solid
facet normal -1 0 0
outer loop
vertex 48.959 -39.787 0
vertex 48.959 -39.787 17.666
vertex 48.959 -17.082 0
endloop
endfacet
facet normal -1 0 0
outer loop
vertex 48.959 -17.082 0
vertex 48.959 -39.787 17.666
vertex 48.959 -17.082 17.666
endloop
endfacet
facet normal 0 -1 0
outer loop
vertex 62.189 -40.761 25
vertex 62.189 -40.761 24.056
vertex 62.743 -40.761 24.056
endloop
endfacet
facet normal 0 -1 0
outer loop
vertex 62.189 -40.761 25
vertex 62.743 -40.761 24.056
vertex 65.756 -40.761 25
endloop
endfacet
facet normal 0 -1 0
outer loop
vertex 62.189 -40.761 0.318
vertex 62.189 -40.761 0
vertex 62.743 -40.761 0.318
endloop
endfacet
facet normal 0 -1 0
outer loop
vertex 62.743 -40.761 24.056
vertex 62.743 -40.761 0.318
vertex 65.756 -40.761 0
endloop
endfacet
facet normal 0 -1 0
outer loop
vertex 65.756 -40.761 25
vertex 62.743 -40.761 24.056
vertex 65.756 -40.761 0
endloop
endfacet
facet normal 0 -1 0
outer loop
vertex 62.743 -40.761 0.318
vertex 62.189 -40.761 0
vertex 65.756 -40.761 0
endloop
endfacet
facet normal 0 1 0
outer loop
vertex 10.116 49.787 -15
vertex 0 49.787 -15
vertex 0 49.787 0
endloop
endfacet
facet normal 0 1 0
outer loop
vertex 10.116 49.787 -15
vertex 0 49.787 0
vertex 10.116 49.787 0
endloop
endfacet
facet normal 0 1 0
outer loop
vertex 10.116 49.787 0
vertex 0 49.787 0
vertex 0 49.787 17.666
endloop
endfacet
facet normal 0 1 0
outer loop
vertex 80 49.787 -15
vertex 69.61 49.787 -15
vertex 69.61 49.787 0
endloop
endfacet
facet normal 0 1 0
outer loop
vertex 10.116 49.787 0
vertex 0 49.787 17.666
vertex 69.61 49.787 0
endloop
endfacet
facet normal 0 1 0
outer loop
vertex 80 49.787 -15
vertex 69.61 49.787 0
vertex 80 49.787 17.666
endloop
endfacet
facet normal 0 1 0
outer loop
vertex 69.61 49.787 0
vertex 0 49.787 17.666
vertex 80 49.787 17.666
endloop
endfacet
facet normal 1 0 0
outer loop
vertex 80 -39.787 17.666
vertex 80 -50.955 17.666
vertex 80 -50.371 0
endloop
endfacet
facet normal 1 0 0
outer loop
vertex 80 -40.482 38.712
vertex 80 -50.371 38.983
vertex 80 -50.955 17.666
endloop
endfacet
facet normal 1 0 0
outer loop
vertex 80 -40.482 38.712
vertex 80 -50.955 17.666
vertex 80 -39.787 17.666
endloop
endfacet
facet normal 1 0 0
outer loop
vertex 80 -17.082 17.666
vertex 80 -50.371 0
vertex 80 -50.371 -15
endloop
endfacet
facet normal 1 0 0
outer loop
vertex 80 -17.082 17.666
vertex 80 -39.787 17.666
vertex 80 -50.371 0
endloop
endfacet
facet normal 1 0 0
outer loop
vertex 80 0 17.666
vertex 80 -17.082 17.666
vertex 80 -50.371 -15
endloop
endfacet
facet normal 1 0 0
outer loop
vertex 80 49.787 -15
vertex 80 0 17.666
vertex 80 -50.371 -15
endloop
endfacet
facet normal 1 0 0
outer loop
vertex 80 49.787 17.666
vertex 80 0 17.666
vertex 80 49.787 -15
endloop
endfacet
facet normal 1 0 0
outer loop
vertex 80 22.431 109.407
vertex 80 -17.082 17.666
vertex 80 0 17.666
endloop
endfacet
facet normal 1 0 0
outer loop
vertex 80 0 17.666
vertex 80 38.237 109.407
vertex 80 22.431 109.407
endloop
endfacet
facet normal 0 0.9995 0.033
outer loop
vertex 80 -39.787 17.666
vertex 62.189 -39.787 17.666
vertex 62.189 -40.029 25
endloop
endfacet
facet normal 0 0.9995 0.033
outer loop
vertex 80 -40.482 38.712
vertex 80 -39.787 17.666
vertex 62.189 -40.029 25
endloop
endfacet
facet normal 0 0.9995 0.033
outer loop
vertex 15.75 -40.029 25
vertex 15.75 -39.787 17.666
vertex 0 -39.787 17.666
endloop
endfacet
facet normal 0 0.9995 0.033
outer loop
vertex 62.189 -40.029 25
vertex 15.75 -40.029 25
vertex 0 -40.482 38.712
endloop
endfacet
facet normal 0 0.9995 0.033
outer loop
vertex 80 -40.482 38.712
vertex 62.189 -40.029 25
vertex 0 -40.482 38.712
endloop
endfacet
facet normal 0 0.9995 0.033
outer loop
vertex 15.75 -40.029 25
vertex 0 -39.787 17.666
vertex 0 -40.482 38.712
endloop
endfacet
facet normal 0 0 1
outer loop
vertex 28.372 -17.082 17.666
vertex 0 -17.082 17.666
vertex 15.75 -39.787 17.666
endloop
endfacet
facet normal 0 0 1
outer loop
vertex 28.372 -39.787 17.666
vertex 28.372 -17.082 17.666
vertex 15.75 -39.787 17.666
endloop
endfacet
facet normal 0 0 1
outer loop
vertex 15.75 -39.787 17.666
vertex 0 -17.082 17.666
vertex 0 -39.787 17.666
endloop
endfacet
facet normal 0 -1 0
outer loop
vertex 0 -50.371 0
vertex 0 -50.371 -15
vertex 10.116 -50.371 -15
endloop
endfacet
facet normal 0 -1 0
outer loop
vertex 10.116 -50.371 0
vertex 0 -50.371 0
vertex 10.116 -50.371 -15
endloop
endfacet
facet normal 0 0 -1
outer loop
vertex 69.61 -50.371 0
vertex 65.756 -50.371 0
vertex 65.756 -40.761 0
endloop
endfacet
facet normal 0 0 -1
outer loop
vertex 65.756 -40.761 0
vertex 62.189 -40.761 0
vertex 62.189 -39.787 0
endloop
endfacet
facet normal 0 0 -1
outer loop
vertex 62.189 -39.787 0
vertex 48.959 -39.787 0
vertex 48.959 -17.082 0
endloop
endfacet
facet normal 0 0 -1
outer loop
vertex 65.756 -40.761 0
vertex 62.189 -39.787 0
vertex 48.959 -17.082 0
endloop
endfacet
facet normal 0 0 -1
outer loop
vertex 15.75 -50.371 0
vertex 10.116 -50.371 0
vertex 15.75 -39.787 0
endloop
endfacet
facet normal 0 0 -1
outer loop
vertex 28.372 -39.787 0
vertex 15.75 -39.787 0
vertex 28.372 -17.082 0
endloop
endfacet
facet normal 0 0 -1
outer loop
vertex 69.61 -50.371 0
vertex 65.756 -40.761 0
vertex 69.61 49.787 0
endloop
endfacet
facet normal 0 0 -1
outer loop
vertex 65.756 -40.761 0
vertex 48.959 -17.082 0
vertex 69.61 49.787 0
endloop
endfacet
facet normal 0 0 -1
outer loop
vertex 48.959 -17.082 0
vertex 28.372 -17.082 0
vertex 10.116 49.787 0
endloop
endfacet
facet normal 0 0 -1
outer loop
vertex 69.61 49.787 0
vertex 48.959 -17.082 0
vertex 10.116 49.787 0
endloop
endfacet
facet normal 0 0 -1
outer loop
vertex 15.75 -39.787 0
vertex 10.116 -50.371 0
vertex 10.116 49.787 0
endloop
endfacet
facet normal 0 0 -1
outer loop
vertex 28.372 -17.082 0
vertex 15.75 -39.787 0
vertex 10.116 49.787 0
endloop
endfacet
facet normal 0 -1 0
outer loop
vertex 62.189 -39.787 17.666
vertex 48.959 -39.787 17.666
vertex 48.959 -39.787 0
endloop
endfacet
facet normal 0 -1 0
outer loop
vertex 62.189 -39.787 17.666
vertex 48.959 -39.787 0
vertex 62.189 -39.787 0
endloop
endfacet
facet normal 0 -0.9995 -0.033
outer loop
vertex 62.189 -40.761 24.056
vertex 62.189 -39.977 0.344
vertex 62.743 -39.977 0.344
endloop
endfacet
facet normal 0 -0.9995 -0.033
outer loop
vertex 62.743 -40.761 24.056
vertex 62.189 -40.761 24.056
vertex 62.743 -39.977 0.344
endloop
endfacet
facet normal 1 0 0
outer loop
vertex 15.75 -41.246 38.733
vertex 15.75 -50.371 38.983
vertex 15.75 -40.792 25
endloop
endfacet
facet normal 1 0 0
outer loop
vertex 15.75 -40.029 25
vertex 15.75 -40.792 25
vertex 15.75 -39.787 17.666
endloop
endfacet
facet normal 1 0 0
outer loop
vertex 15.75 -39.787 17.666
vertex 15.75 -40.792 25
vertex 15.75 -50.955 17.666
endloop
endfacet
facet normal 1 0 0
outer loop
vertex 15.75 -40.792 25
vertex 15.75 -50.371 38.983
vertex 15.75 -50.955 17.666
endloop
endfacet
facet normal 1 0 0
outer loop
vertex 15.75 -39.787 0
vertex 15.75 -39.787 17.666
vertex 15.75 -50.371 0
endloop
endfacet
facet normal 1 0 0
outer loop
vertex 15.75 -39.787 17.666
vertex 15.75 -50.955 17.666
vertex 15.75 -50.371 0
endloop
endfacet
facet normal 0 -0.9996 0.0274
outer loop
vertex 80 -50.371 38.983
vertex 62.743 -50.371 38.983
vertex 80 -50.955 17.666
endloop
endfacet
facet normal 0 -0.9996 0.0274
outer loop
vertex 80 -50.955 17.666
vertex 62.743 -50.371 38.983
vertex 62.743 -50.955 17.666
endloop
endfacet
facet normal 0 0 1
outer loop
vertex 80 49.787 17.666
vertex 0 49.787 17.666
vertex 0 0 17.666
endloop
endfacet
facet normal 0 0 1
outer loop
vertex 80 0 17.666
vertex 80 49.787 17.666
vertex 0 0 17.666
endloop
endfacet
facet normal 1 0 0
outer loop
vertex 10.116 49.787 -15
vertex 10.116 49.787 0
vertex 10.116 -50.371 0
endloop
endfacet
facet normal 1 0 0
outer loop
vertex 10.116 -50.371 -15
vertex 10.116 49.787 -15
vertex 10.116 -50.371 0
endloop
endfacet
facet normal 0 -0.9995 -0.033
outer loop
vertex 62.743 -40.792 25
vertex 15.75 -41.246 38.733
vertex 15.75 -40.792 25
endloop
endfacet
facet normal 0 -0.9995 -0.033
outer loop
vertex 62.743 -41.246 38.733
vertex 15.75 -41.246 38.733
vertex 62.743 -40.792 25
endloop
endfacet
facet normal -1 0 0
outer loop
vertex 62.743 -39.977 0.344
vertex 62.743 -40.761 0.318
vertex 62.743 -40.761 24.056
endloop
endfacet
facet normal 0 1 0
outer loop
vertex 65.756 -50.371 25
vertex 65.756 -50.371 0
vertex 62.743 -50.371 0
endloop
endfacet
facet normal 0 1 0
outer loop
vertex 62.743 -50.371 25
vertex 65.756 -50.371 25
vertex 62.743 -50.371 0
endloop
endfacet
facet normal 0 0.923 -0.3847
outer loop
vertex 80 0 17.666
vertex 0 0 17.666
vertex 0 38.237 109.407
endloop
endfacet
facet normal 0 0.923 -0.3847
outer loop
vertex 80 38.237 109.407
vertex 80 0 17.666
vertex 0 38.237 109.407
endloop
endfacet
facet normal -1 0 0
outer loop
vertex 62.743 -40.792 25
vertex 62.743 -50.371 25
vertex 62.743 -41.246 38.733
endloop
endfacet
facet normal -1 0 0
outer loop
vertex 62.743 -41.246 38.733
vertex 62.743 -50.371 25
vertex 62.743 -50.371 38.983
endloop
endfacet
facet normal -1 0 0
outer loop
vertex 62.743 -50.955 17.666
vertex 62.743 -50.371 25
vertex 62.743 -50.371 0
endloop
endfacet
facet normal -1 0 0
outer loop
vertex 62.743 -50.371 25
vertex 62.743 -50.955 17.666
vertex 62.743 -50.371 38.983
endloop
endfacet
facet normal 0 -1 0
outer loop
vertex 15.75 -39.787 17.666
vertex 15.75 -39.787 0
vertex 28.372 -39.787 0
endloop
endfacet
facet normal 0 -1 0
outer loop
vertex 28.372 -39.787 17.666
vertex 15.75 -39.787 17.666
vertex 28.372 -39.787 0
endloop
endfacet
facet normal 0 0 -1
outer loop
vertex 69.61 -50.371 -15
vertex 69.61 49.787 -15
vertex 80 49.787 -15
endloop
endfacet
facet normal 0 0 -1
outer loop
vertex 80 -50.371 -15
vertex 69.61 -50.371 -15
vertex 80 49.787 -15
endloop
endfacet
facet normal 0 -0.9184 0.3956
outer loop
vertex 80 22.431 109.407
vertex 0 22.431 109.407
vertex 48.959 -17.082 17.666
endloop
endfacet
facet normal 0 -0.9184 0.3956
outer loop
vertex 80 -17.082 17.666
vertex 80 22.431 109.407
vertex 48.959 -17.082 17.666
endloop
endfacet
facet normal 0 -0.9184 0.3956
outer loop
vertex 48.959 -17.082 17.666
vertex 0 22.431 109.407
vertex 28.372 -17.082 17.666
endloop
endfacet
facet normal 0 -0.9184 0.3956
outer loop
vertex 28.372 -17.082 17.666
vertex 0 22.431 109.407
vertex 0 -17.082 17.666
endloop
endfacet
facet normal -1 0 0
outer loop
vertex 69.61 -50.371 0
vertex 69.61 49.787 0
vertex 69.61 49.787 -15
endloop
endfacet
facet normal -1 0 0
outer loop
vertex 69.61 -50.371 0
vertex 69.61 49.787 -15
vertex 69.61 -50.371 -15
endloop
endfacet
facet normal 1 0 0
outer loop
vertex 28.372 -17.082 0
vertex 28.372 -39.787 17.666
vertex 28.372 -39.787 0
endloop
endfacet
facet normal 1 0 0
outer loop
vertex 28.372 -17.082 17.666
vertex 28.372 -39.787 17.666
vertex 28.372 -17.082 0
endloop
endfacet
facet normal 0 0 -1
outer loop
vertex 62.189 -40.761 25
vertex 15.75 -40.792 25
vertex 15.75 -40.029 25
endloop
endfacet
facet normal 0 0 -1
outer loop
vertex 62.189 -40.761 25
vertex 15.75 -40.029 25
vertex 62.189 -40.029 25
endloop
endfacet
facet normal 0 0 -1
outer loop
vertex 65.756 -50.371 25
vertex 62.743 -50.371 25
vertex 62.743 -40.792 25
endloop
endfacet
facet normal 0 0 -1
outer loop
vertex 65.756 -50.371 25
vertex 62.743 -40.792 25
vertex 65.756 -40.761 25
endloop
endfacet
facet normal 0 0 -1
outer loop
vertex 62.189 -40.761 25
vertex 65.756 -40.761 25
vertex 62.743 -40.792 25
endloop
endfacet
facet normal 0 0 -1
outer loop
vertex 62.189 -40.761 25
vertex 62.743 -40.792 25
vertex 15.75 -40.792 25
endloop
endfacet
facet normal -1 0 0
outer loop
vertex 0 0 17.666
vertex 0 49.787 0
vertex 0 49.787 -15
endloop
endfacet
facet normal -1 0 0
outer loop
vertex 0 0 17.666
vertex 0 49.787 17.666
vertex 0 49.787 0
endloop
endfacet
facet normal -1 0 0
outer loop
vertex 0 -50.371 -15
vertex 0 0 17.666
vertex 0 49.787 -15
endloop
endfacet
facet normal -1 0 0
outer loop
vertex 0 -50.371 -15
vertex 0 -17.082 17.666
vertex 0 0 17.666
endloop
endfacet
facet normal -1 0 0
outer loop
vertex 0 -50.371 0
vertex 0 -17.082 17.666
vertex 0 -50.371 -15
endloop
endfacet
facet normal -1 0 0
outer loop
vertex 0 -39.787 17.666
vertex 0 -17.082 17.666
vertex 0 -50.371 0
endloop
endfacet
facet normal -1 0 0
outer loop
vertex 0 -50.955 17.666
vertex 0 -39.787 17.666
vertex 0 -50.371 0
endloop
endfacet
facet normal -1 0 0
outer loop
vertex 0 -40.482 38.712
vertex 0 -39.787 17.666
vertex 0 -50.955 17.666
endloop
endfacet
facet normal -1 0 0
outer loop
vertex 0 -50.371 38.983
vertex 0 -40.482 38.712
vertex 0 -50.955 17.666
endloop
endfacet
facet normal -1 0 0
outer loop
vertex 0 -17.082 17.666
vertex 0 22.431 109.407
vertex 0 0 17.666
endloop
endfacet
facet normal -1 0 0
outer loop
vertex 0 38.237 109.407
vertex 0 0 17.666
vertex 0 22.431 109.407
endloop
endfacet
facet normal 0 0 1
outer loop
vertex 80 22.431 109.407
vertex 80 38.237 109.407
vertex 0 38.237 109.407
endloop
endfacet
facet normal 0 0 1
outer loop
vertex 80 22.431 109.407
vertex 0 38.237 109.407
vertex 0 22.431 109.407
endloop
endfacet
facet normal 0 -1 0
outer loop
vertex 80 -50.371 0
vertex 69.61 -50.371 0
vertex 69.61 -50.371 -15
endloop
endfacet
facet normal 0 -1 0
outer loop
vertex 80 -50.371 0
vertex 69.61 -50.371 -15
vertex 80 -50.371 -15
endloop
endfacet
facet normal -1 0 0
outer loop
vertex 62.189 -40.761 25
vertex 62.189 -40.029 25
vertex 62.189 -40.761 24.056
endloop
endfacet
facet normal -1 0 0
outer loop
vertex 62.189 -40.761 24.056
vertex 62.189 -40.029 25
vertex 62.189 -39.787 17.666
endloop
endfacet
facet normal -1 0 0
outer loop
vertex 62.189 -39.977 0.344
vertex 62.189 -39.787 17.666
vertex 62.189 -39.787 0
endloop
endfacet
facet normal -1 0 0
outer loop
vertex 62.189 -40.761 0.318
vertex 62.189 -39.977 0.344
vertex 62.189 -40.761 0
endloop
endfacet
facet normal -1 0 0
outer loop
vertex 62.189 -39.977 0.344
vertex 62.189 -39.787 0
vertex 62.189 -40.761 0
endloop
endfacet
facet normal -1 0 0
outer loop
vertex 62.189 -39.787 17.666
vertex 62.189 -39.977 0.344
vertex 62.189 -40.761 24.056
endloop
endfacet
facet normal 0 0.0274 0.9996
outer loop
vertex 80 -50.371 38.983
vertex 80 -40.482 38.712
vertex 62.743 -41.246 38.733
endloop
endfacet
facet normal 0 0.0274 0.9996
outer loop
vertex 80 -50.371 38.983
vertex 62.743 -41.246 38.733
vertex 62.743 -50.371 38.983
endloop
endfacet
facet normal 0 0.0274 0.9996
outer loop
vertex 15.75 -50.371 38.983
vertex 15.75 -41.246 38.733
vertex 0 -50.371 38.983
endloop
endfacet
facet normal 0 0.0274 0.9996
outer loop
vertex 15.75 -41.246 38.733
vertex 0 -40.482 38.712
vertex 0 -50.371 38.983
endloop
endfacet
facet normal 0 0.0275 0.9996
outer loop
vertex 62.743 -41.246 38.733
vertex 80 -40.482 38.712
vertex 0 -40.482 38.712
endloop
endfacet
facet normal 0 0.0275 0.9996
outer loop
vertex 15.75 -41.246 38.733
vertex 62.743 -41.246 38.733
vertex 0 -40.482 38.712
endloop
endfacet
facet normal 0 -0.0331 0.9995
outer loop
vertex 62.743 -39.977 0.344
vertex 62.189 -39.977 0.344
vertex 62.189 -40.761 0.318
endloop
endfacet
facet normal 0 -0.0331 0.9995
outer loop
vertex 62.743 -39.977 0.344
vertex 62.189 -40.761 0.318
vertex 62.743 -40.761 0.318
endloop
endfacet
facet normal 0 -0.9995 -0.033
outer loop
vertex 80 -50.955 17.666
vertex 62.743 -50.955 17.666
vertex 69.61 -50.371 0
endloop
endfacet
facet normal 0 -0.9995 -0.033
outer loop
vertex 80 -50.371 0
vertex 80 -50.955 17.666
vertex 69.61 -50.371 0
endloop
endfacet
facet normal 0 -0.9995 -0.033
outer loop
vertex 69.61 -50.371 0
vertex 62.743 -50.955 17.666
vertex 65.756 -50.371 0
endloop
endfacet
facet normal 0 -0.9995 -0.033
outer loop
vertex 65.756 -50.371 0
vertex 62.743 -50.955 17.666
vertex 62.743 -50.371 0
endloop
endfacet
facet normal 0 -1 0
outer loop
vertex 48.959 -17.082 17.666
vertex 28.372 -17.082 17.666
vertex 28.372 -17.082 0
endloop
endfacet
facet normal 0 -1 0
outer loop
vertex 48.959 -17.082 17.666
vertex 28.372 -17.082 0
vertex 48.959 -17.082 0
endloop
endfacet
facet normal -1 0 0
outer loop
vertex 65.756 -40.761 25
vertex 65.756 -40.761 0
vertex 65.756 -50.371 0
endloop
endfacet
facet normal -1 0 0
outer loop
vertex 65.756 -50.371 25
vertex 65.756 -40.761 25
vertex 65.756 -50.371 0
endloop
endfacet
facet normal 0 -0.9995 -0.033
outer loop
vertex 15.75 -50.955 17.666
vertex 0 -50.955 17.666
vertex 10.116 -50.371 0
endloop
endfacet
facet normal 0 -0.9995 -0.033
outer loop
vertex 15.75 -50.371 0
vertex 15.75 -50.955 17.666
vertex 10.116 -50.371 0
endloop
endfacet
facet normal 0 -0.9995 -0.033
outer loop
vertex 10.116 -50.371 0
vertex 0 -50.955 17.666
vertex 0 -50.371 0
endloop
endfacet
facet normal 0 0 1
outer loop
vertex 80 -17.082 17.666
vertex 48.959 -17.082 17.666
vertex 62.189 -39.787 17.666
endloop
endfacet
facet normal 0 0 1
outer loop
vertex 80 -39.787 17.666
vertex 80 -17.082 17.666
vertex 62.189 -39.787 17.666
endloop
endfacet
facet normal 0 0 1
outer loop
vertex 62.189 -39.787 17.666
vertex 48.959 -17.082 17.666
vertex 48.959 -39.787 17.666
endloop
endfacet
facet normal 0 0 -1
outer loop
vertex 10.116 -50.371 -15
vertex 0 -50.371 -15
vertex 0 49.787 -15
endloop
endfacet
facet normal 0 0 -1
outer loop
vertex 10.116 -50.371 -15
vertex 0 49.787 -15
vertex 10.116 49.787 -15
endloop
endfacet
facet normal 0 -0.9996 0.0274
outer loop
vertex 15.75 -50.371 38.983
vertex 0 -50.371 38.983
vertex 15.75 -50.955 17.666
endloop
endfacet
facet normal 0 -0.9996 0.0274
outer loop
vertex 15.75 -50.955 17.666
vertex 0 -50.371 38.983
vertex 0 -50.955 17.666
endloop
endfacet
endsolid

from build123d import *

# Parameters (mm, degrees)
F1_DEPTH  = 80
F2_W      = 10.1163312793
F2_H      = 100.1585014164
F2_W_2    = 10.3900524974
F3_DEPTH  = 15
F6_W      = 19.9106484652
F6_H      = 22.7042857278
F7_DEPTH  = 17.6
F8_W      = 20.5874107778
F8_H      = 22.7042857278
F9_DEPTH  = 17.7
F10_W     = 46.9934158027
F10_H     = 17.6760927897
F10_H_2   = 21.9856097649
F11_DEPTH = 10.4
F13_DEPTH = 25
F15_DEPTH = 25


# Not quite as in the source:
# - a feature of the source that left no trace in its solid (it failed there, or was rolled back) is left out


with BuildPart() as f1:
    # F0 (on Right) → F1 (new body)
    with BuildSketch(Plane.YZ):
        Polygon((22.4307589233, 109.4066873193), (-17.082426697, 17.6664423198), (0, 17.6664423198), (38.2366999984, 109.4066873193), align=None)
        Polygon((-39.7867124248, 17.6664423198), (-39.2026986647, 0), (49.7872419655, 0), (49.7872419655, 17.6664423198), (0, 17.6664423198), (-17.082426697, 17.6664423198), align=None)
        Polygon((-50.955273211, 17.6664423198), (-50.3712594509, 0), (-39.2026986647, 0), (-39.7867124248, 17.6664423198), align=None)
        Polygon((-50.3712594509, 38.982976228), (-50.955273211, 17.6664423198), (-39.7867124248, 17.6664423198), (-40.4824339626, 38.7120499047), align=None)
    extrude(amount=F1_DEPTH)

    # F2 (on face) → F3 (join)
    with BuildSketch(Plane(origin=(0, 0, 0), x_dir=(1, 0, 0), z_dir=(0, 0, -1))):
        with Locations((5.0581656396, 0.2920087427)):
            Rectangle(F2_W, F2_H)
        with Locations((74.8049737513, 0.2920087427)):
            Rectangle(F2_W_2, F2_H)
    extrude(amount=F3_DEPTH)

    # F6 (on face) → F7 (join)
    with BuildSketch(Plane.XY.offset(17.6664423198)):
        with Locations((39.5665168762, -28.4345695609)):
            Rectangle(F6_W, F6_H)
    extrude(amount=-F7_DEPTH)

    # F8 (on face) → F9 (cut)
    with BuildSketch(Plane.XY.offset(17.6664423198)):
        with Locations((38.6653598398, -28.4345695609)):
            Rectangle(F8_W, F8_H)
    extrude(amount=-F9_DEPTH, mode=Mode.SUBTRACT)

    # F10 (on face) → F11 (cut)
    with BuildSketch(Plane(origin=(0, -50.316272907, -1.6633454095), x_dir=(1, 0, 0), z_dir=(0, -0.9994540383, -0.0330397541))):
        with Locations((39.2467323691, 10.5023004233)):
            Rectangle(F10_W, F10_H)
        with Locations((39.2467323691, 30.3331517006)):
            Rectangle(F10_W, F10_H_2)
    extrude(amount=-F11_DEPTH, mode=Mode.SUBTRACT)

    # F12 (on face) → F13 (cut)
    with BuildSketch(Plane(origin=(0, 0, 0), x_dir=(1, 0, 0), z_dir=(0, 0, -1))):
        Polygon((62.7434402704, 50.3712594509), (15.7500244677, 50.3712594509), (15.7500244677, 40.7608151436), (65.7564029098, 40.7608151436), (65.7564029098, 50.3712594509), align=None)
    extrude(amount=-F13_DEPTH, mode=Mode.SUBTRACT)

    # F14 (on face) → F15 (cut)
    with BuildSketch(Plane(origin=(0, 0, 0), x_dir=(1, 0, 0), z_dir=(0, 0, -1))):
        Polygon((62.1888265014, 40.7608151436), (15.7500244677, 40.7608151436), (15.7500244677, 39.7867124248), (28.3716544509, 39.7867124248), (48.9590652287, 39.7867124248), (62.1888265014, 39.7867124248), align=None)
    extrude(amount=-F15_DEPTH, mode=Mode.SUBTRACT)


solid = f1.part
